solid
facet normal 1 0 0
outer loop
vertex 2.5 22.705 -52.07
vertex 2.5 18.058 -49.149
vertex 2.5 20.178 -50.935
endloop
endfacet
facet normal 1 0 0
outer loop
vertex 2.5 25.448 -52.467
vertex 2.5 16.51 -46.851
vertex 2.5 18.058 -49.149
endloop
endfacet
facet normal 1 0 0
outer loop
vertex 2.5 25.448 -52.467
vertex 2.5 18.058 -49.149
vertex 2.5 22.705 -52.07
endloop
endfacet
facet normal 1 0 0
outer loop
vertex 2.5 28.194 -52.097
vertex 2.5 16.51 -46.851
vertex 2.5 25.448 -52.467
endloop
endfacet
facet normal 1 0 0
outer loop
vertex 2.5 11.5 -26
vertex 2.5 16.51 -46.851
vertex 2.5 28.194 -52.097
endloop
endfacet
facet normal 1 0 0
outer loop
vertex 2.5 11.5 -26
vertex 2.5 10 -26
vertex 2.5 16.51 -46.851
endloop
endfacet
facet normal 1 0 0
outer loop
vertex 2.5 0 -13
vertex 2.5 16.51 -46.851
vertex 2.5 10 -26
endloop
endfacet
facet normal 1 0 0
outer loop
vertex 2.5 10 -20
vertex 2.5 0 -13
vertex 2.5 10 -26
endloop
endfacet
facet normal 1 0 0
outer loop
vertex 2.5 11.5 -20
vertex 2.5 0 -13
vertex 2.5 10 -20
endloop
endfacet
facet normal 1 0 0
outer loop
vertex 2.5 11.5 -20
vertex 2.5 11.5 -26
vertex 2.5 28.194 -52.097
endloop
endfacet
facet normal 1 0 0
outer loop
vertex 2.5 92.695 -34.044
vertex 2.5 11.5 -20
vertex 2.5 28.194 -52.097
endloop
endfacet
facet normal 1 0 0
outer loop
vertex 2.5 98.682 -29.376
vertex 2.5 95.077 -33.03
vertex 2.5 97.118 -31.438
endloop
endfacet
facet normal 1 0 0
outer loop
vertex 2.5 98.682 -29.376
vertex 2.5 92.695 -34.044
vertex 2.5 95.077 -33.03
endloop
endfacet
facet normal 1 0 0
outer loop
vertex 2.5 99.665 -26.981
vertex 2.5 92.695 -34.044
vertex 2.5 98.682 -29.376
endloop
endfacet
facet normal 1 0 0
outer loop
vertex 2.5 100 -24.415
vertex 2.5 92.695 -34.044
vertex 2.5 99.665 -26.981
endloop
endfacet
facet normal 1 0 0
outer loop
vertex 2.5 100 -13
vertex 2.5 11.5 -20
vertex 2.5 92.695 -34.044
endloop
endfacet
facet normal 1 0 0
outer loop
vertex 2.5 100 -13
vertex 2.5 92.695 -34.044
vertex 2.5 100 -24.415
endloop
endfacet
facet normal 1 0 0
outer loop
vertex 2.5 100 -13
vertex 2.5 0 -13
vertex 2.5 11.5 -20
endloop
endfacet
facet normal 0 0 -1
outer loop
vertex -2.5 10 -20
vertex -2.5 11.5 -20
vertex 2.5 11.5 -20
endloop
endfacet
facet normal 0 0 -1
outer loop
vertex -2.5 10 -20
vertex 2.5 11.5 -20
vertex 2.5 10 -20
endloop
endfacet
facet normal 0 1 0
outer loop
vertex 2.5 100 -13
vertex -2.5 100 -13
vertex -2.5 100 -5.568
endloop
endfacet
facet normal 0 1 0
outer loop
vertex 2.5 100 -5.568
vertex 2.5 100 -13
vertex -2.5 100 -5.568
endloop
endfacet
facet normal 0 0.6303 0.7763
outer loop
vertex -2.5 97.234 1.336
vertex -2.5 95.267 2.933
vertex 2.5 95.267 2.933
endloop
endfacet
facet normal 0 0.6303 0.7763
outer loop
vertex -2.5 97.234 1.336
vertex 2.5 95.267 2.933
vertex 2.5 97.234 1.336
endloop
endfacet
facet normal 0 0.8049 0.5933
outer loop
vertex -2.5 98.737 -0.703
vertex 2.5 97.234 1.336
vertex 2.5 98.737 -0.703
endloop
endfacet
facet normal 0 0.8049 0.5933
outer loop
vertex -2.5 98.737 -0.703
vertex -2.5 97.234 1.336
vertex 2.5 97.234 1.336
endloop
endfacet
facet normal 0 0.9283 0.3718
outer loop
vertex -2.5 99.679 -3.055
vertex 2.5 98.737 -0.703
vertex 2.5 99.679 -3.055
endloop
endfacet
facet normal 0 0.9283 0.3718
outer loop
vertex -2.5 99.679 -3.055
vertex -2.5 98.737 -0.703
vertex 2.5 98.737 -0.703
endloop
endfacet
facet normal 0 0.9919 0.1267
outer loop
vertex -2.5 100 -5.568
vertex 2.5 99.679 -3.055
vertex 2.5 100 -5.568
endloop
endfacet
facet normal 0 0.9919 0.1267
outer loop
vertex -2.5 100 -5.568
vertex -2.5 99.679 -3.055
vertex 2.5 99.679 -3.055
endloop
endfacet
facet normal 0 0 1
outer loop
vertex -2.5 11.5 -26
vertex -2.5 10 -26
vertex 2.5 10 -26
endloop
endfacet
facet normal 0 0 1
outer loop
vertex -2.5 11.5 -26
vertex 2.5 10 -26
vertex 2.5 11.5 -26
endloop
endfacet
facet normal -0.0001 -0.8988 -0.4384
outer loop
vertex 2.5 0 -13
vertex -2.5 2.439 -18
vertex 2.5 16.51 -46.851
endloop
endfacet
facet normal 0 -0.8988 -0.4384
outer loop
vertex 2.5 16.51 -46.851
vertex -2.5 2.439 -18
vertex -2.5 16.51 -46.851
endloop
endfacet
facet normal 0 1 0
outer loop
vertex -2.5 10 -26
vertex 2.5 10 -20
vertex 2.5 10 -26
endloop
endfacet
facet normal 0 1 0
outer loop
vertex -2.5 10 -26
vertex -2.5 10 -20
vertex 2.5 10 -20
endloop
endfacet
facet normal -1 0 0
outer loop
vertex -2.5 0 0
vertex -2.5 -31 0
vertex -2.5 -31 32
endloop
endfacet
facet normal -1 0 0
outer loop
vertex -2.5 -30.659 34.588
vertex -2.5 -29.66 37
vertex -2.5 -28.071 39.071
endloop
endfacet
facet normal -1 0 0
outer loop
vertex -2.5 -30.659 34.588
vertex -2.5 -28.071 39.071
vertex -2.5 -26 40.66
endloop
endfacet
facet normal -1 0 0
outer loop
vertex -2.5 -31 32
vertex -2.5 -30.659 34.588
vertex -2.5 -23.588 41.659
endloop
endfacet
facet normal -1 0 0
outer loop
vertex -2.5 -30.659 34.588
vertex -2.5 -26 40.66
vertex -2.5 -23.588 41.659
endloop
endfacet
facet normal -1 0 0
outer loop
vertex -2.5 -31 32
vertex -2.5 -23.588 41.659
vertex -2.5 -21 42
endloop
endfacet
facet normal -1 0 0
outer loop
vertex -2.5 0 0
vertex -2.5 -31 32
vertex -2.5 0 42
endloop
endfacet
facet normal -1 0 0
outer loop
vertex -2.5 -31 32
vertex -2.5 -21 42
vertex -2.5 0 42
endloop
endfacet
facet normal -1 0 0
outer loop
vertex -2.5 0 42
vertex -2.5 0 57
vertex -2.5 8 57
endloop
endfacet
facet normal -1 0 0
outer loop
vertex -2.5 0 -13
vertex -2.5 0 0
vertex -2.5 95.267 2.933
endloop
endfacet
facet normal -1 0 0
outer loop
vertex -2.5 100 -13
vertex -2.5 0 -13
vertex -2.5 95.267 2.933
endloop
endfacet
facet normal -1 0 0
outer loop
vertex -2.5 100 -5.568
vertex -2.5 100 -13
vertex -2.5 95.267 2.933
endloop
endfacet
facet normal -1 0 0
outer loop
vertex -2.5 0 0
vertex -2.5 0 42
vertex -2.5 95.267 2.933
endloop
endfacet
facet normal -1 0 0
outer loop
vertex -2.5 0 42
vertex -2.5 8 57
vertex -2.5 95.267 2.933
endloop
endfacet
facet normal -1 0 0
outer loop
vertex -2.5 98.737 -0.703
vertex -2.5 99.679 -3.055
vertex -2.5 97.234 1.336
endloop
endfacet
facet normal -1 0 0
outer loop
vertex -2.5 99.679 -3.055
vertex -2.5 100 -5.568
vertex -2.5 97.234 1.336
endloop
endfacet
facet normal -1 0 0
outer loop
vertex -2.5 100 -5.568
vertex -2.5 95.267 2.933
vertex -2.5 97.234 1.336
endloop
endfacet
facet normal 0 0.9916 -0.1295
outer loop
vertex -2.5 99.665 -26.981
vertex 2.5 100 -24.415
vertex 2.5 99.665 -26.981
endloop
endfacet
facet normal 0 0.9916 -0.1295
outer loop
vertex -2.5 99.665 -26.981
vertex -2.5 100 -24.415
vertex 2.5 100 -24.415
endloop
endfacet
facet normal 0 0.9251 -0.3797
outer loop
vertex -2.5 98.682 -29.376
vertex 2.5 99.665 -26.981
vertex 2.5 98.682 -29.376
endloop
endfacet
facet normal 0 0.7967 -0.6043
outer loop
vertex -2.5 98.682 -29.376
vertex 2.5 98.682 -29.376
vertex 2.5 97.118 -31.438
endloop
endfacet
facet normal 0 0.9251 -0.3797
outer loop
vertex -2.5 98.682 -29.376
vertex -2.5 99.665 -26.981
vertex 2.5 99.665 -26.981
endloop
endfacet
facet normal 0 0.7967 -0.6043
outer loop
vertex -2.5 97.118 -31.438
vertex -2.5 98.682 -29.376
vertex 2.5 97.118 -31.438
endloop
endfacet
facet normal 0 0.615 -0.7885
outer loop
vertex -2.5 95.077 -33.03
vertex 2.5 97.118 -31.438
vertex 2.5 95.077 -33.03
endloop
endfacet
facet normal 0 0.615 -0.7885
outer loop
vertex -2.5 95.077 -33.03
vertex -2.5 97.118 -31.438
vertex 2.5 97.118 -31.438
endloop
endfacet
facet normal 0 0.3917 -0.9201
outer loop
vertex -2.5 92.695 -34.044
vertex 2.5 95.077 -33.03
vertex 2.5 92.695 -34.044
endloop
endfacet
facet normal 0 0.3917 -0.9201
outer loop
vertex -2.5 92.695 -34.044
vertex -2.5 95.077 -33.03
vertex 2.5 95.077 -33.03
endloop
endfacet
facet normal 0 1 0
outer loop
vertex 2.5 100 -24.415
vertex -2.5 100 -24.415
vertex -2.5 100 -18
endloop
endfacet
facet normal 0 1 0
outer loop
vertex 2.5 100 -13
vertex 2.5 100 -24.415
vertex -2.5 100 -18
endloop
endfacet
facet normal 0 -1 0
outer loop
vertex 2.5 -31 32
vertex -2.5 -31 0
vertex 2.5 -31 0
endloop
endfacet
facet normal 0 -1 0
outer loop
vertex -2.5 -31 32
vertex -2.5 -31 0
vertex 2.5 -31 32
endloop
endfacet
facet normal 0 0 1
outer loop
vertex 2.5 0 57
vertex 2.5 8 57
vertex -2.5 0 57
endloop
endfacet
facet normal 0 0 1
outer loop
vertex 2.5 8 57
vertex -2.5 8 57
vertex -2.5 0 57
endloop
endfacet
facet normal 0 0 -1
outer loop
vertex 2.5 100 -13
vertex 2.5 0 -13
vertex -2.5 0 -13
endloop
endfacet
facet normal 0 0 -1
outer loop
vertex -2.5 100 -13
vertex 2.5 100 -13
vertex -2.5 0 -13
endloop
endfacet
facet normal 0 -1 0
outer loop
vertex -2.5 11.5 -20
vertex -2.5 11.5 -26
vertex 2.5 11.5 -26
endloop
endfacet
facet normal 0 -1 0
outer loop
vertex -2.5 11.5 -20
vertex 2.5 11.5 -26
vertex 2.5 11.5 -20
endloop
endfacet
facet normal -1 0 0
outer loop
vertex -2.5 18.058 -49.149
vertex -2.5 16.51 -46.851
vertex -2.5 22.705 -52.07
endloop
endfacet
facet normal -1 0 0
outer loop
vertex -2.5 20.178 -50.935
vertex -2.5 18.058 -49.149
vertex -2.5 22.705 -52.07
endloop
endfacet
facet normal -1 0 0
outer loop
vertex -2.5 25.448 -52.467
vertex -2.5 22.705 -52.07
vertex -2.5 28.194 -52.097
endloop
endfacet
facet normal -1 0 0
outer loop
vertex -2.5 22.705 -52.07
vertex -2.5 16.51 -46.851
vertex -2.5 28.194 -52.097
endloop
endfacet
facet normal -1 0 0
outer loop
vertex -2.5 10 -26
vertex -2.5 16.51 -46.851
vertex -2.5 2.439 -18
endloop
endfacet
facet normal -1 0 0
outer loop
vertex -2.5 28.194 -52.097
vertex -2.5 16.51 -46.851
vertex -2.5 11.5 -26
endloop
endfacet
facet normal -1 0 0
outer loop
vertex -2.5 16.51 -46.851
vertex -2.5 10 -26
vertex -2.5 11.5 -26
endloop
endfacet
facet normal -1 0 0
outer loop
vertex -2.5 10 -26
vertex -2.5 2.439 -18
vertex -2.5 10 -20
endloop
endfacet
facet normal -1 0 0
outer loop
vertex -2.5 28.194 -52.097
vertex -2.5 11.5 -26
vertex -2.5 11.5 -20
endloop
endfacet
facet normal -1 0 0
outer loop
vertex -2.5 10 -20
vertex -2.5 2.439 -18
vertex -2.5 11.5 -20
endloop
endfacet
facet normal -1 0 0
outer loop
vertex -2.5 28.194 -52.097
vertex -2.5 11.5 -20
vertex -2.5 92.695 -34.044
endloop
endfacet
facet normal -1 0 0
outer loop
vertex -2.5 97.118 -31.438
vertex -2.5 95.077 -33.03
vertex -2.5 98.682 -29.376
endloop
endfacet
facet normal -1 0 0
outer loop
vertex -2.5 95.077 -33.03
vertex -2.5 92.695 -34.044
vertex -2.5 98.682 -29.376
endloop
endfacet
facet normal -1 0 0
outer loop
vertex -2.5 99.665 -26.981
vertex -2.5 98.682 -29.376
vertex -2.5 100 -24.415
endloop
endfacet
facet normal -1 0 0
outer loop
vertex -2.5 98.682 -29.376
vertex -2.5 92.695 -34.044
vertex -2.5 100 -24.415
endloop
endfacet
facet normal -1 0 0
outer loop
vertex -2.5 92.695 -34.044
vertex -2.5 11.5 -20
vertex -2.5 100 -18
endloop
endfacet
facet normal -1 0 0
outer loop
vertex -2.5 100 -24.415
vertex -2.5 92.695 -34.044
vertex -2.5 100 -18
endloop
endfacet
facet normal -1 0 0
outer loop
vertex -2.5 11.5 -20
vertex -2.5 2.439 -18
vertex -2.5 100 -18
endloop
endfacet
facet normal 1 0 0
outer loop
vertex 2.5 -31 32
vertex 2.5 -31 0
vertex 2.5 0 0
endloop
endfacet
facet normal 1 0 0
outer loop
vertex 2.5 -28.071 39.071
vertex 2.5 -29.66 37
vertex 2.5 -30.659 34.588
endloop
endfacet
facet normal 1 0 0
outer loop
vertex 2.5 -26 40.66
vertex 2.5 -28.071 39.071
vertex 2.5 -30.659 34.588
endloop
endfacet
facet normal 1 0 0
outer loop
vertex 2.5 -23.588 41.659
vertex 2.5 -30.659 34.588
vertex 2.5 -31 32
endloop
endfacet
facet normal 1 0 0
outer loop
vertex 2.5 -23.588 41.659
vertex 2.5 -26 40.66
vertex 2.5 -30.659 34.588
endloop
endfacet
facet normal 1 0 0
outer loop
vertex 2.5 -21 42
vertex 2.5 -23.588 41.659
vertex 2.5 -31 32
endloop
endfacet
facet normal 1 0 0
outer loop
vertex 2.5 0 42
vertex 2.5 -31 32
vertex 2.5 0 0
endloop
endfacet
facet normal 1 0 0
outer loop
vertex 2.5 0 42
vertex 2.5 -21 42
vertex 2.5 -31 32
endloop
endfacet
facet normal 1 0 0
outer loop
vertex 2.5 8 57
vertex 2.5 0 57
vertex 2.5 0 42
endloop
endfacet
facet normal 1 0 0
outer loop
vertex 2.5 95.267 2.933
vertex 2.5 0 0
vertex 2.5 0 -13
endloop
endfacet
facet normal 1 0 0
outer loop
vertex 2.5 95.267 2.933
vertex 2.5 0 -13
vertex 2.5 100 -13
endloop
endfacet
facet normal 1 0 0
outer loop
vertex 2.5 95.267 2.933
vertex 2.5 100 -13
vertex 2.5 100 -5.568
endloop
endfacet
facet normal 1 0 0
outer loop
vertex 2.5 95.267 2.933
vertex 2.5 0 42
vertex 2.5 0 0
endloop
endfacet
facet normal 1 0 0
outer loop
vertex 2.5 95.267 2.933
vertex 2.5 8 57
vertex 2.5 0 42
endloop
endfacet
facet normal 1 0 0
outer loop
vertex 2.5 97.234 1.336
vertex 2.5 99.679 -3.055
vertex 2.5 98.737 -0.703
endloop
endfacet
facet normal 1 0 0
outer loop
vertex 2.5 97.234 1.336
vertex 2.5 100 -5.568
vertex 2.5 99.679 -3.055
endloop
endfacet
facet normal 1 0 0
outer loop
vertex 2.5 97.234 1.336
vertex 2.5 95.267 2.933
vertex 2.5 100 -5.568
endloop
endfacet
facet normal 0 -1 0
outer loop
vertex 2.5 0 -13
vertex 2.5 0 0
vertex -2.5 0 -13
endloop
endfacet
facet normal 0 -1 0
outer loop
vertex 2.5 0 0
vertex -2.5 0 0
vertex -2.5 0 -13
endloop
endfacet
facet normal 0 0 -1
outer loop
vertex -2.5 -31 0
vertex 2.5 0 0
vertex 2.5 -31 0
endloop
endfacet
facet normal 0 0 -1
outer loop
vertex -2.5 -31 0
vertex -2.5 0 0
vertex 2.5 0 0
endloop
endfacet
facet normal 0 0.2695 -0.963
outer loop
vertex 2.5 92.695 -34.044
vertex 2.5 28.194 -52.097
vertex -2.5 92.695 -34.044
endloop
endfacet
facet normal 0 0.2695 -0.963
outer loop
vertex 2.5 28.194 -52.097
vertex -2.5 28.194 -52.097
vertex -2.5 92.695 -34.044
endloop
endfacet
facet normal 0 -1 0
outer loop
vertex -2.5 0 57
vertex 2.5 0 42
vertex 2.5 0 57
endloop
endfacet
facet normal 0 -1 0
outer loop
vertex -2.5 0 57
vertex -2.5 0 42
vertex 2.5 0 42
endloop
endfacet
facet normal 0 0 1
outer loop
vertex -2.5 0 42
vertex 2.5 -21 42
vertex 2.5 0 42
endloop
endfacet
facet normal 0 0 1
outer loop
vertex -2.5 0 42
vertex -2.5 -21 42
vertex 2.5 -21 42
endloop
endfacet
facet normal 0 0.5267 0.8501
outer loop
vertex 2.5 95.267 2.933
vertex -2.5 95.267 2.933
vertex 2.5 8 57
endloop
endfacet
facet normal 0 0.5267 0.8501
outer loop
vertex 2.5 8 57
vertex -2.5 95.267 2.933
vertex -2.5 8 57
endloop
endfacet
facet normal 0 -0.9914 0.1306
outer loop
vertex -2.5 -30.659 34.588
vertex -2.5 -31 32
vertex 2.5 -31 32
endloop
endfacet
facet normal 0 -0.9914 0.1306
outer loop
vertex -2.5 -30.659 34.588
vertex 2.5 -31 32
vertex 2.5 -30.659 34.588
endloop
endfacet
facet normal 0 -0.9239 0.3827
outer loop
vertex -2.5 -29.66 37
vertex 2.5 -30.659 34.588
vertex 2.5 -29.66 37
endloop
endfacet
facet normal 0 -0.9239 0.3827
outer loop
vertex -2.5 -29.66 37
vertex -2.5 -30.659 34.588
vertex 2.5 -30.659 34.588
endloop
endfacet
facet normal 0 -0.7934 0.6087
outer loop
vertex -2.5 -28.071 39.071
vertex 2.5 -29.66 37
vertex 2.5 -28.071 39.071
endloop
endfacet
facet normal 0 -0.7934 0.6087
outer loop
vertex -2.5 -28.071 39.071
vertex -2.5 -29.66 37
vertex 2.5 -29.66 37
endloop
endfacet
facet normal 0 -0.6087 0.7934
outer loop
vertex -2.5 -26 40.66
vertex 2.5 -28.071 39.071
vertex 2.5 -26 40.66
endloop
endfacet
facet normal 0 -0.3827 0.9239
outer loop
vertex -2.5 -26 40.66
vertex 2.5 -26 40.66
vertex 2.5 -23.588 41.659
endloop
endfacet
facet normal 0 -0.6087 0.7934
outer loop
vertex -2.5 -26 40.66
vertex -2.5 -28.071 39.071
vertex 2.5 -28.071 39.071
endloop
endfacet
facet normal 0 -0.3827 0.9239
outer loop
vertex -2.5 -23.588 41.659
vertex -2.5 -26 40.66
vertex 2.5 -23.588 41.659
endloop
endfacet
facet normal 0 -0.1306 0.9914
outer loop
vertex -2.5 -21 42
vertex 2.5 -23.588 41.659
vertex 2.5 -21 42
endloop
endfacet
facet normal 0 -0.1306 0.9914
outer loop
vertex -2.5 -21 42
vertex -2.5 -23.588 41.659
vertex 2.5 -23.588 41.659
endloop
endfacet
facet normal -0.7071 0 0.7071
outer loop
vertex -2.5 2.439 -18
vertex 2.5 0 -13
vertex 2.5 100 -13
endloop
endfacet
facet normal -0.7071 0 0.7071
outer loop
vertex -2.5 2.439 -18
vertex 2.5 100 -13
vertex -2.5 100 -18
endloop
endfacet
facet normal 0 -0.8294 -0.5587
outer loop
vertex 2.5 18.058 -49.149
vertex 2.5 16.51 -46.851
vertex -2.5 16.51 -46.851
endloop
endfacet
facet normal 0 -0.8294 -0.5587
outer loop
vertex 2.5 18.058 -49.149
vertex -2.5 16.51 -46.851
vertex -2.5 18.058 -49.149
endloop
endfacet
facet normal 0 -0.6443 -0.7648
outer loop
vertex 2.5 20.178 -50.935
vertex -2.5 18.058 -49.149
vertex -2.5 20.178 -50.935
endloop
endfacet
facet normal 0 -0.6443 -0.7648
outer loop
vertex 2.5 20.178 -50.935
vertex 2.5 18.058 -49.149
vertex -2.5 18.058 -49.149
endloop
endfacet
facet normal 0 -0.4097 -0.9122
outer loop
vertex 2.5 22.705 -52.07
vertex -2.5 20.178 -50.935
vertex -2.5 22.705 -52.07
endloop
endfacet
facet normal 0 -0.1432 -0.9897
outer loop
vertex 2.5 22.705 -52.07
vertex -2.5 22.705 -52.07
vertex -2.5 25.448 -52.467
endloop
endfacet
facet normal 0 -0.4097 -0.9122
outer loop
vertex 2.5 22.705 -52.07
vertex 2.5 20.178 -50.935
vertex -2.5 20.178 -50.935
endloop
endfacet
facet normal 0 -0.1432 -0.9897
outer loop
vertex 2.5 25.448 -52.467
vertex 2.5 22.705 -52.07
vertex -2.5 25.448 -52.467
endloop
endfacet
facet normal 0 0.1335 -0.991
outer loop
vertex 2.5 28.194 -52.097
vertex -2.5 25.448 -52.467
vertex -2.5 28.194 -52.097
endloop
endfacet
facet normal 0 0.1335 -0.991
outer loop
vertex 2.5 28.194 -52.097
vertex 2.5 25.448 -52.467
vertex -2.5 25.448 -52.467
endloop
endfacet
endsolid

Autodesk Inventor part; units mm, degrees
ref_plane "YZ Plane" through (0, 0, 0) normal (1, 0, 0) x (0, 1, 0)
ref_plane "XZ Plane" through (0, 0, 0) normal (0, 1, 0) x (-1, 0, 0)
sketch "Sketch1" plane through (0, 0, 0) normal (1, 0, 0) x (0, 1, 0)
  line L0 (0, 0) -> (-31, 0)
  line L1 (-31, 0) -> (-31, 42)
  line L2 (-31, 42) -> (0, 42)
  line L3 (0, 42) -> (0, 57)
  line L4 (0, 0) -> (0, -13)
  line L5 (0, -13) -> (20.1651, -54.3445)
  line L6 (100, -32) -> (100, 0)
  line L7 (100, 0) -> (8, 57)
  line L8 (20.1651, -54.3445) -> (100, -32)
  line L9 (8, 57) -> (0, 57)
  dimension "d0" = 31
  dimension "d1" = 42
  dimension "d2" = 15
  dimension "d3" = 13
  dimension "d4" = 46
  dimension "d5" = 154
  dimension "d6" = 100
  dimension "d8" = 32
  dimension "d14" = 8
extrude "Extrusion1" add sketch "Sketch1" along normal mid plane 5
fillet "Fillet1" radius 10 4 edges at (0, 100, 0) (0, 100, -32) (0, -31, 42) (0, 20.1651, -54.3445)
sketch "Sketch2" plane through (-2.5, 0, -13) normal (0, -1, 0) x (1, 0, 0)
  line L0 (5, 0) -> (0, 0) projected
  line L1 (5, 13) -> (5, 0) projected
  line L2 (0, 13) -> (5, 13) projected
  line L3 (0, 0) -> (0, 13) projected
  line L4 (0, 0) -> (0, -5)
  line L5 (0, -41.3445) -> (0, 0) projected
  line L6 (5, 0) -> (0, -5)
  line L7 (5, 0) -> (0, 0) projected
  line L8 (5, 0) -> (0, 0)
  point P0 (2.5, 13)
extrude "Extrusion2" cut sketch "Sketch2" against normal through all contours L6 L4 L0
ref_plane "Work Plane1" through (-2.5, 0, -13) normal (0, 0, -1) x (-1, 0, 0)
split body "Split1" result two bodies by plane through (-2.5, 0, -13) normal (0, 0, -1) first body at (2, 42.7312, -26.0325)
sketch "Sketch3" plane through (-2.5, 0, 0) normal (-1, 0, 0) x (0, 0, 1)
  line L0 (-26, 11.5) -> (-20, 11.5)
  line L1 (-20, 11.5) -> (-20, 10)
  line L2 (-20, 10) -> (-26, 10)
  line L3 (-26, 10) -> (-26, 11.5)
  line L4 (-13, 100) -> (-13, 0) projected
  point P0 (0, 0)
  dimension "d15" = 6
  dimension "d16" = 1.5
  dimension "d17" = 10
  dimension "d18" = 7
extrude "Extrusion3" cut sketch "Sketch3" against normal through all bodies 2
equation "\"d9\" = Thickness"
equation "\"d12\" = Thickness"
equation "\"Thickness\" = 5"
properties part number "vertical_stablilizer" material "Foam board"
